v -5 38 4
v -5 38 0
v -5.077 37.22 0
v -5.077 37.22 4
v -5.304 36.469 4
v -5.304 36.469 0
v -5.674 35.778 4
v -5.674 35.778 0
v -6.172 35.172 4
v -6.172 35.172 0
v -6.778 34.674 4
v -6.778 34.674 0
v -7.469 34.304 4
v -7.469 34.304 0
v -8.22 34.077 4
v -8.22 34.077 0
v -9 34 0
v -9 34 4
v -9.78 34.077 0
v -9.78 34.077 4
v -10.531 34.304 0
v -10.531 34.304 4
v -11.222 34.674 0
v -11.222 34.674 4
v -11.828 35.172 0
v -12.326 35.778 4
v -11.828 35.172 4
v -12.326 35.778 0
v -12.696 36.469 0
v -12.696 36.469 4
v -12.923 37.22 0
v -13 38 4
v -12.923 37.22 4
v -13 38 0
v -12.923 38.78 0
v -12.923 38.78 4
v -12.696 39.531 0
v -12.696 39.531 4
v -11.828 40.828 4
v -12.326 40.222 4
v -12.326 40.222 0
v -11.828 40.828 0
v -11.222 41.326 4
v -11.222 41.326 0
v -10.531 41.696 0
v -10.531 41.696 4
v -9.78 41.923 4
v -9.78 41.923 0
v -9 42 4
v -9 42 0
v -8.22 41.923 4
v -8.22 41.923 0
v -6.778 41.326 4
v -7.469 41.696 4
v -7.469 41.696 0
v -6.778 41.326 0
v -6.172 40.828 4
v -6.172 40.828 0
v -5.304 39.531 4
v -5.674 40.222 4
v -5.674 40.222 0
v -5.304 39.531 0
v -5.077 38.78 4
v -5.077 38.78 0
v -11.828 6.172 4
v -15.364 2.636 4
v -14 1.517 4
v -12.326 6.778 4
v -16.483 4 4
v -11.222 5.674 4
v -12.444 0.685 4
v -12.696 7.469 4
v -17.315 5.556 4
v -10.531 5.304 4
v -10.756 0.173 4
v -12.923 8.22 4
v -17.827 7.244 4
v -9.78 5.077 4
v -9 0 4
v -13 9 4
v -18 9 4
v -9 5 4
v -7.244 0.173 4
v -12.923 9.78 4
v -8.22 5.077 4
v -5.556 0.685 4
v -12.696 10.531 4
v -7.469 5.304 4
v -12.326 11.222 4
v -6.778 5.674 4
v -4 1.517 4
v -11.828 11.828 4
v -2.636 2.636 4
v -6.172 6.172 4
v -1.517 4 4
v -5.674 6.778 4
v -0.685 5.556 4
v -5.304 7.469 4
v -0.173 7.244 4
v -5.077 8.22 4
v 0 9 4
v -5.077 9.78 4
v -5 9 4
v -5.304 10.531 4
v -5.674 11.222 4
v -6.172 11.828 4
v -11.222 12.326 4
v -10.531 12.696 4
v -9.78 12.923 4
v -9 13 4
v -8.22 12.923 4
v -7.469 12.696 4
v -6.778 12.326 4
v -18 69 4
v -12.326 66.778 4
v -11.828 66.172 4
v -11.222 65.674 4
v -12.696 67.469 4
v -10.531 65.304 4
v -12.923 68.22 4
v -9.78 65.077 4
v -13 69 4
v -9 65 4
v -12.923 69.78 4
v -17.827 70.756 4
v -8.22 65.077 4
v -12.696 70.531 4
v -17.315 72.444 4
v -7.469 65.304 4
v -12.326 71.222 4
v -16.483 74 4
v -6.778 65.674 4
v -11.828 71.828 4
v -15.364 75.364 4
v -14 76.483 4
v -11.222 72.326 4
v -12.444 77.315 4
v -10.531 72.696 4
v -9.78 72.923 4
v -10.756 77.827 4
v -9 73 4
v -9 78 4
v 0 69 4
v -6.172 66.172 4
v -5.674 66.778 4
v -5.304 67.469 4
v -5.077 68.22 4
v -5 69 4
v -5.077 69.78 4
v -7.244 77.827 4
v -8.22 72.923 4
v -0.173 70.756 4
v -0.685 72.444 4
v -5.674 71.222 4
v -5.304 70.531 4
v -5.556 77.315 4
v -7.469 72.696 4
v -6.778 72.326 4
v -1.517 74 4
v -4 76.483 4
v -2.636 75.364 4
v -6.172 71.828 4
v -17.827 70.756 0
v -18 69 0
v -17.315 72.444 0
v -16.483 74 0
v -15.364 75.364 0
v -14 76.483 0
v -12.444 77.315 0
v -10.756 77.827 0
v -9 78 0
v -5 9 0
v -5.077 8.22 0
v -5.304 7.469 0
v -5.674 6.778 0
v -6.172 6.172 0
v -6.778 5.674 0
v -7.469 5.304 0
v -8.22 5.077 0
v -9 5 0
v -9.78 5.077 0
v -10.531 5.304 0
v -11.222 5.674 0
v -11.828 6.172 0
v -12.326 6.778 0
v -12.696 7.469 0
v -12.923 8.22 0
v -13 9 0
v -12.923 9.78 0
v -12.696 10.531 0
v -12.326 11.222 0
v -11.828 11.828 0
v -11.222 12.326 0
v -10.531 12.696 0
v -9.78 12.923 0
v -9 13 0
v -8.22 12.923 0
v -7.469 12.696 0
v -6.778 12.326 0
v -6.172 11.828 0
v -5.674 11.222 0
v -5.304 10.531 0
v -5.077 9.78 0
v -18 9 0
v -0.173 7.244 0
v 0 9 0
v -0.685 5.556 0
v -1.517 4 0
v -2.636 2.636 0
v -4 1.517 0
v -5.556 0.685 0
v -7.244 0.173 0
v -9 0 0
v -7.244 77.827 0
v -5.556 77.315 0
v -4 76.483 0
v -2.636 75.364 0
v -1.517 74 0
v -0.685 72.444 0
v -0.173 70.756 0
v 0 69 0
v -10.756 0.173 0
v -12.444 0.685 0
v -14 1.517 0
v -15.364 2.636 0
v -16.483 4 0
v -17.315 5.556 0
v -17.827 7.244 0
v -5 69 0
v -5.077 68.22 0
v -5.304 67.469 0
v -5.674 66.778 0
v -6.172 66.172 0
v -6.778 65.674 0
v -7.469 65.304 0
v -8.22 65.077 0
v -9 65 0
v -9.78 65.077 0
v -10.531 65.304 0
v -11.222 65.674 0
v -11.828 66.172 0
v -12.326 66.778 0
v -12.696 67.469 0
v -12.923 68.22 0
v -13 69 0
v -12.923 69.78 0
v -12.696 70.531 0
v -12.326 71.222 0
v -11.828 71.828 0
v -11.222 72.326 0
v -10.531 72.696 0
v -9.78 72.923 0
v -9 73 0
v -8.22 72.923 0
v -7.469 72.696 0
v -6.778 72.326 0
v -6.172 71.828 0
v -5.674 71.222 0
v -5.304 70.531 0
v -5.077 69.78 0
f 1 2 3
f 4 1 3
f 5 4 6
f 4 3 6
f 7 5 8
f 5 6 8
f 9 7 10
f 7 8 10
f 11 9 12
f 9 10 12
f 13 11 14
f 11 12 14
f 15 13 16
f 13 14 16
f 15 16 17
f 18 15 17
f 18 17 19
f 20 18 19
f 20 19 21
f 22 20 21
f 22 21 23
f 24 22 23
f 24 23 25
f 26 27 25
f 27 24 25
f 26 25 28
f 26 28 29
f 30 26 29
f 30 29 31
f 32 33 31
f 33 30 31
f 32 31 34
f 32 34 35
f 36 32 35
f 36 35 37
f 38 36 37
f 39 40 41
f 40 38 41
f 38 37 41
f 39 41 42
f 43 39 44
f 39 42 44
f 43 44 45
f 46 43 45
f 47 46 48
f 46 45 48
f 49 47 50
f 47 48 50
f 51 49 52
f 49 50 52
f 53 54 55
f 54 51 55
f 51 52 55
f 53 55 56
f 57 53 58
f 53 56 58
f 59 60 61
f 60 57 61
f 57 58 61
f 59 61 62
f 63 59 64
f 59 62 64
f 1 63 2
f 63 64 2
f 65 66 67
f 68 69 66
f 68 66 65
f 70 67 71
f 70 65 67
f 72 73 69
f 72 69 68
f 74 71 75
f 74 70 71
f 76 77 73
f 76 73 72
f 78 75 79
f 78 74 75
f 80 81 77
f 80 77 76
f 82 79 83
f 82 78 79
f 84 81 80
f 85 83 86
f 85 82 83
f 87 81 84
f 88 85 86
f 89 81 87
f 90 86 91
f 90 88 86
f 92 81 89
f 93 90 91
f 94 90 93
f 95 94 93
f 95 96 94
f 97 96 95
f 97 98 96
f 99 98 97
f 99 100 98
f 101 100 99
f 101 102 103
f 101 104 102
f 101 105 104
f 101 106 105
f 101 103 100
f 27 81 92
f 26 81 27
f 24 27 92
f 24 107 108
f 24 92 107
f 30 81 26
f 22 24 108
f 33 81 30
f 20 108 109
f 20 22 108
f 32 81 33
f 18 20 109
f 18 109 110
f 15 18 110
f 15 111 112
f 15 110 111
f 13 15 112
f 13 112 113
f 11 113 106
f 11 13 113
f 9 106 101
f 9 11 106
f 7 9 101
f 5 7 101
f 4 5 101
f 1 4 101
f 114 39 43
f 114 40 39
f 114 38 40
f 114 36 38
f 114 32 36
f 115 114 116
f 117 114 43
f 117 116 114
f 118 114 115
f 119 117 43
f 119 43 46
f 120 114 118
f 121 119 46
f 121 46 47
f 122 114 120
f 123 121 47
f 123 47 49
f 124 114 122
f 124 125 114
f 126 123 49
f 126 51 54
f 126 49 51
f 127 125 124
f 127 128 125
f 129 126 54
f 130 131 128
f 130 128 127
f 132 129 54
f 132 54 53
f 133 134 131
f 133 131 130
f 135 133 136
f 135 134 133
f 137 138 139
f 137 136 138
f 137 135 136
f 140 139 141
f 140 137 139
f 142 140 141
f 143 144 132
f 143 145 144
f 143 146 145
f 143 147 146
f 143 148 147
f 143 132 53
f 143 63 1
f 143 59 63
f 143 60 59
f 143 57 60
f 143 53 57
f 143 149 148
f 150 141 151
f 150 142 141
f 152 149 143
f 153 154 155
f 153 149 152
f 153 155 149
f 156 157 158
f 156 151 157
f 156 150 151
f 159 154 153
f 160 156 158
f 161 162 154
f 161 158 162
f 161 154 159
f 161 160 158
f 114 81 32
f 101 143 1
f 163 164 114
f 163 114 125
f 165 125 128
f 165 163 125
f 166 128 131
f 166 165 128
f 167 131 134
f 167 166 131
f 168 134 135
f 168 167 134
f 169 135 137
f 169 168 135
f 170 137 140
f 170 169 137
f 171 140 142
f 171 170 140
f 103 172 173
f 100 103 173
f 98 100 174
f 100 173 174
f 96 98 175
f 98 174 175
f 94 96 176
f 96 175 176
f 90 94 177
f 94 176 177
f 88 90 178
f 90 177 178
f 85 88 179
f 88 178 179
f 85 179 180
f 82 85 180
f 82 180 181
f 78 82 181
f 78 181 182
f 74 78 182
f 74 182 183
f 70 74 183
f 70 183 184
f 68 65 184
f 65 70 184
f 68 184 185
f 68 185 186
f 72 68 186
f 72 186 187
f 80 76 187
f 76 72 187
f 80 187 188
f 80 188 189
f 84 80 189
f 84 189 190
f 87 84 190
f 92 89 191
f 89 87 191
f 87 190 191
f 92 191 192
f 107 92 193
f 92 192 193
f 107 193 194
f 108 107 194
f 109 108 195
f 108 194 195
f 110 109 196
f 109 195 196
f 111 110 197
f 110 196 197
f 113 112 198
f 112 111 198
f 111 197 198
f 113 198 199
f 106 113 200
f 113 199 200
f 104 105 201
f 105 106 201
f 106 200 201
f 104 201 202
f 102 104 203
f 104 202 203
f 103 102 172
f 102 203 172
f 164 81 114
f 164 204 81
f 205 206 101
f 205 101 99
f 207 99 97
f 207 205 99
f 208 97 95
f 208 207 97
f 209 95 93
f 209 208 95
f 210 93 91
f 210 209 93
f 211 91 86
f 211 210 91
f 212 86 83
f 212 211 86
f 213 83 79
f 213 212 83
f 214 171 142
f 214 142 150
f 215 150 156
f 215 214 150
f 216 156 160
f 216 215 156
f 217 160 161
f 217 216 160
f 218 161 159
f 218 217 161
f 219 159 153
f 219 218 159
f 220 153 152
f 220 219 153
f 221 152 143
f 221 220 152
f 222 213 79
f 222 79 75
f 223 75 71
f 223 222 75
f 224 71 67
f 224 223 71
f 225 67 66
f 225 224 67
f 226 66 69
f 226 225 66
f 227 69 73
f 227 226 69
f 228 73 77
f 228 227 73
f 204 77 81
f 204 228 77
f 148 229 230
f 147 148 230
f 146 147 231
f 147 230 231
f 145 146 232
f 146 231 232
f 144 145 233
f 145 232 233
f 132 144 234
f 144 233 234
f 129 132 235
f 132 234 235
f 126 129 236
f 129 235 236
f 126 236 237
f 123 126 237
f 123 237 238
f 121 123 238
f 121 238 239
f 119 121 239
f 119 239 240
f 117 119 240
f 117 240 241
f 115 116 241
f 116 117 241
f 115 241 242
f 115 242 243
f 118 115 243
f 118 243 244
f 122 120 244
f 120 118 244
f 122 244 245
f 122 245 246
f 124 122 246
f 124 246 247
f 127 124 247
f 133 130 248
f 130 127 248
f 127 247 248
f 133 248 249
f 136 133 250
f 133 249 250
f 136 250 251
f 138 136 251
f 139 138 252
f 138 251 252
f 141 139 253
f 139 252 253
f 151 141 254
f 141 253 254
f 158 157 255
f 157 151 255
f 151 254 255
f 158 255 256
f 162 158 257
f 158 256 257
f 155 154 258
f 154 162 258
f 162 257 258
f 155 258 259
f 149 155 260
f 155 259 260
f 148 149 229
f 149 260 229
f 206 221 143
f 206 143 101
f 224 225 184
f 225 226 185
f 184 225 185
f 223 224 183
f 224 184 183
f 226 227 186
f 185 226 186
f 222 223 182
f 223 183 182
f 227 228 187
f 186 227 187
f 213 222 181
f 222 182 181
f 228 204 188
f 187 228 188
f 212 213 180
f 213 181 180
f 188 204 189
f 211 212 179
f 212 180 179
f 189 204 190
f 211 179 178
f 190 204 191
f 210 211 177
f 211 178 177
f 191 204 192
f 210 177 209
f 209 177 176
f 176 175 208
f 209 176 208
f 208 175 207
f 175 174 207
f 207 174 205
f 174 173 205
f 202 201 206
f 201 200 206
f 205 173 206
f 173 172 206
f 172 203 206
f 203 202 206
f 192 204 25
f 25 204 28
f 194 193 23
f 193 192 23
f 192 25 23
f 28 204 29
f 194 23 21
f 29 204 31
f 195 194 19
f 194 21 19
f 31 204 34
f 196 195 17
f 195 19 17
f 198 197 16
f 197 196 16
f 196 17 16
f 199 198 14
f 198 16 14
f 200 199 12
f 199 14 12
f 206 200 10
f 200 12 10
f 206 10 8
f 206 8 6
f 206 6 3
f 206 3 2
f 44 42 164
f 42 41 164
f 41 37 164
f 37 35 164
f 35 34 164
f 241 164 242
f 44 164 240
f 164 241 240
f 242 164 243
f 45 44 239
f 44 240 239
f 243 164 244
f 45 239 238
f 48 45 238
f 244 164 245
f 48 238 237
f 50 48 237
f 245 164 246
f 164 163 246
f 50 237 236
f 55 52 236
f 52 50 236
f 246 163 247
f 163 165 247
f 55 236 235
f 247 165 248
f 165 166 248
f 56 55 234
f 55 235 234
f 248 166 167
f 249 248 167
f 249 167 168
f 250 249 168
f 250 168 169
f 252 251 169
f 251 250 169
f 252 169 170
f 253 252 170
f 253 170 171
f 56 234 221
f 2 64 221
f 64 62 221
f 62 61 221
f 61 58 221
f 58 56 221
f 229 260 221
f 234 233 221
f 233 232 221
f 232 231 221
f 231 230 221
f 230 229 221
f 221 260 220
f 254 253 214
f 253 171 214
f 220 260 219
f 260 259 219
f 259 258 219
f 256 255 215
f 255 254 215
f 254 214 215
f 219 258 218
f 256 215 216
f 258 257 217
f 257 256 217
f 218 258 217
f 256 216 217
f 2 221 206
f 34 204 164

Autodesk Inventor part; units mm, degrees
ref_plane "YZ Plane" through (0, 0, 0) normal (1, 0, 0) x (0, 1, 0)
ref_plane "XZ Plane" through (0, 0, 0) normal (0, 1, 0) x (-1, 0, 0)
ref_plane "XY Plane" through (0, 0, 0) normal (0, 0, 1) x (1, 0, 0)
sketch "Sketch1" plane through (0, 0, 0) normal (0, 0, 1) x (1, 0, 0)
  line L0 (-9, 0) -> (-9, 0)
  line L1 (-18, 9) -> (-18, 69)
  line L2 (-9, 78) -> (-9, 78)
  line L3 (0, 69) -> (0, 9)
  circle A0 centre (-9, 38) radius 4
  arc A1 (-18, 9) -> (-9, 0) centre (-9, 9) ccw
  arc A2 (-9, 0) -> (0, 9) centre (-9, 9) ccw
  arc A3 (0, 69) -> (-9, 78) centre (-9, 69) ccw
  arc A4 (-9, 78) -> (-18, 69) centre (-9, 69) ccw
  circle A5 centre (-9, 9) radius 4
  circle A6 centre (-9, 69) radius 4
  point P0 (0, 0)
  point P1 (-18, 78)
  point P2 (-18, 0)
  point P3 (0, 78)
  dimension "d0" = 18
  dimension "d1" = 78
  dimension "d2" = 8
  dimension "d3" = 9
  dimension "d4" = 8
  dimension "d5" = 8
extrude "Extrusion1" add sketch "Sketch1" along normal blind 4
properties part number "zawieszenie ramie 2"
